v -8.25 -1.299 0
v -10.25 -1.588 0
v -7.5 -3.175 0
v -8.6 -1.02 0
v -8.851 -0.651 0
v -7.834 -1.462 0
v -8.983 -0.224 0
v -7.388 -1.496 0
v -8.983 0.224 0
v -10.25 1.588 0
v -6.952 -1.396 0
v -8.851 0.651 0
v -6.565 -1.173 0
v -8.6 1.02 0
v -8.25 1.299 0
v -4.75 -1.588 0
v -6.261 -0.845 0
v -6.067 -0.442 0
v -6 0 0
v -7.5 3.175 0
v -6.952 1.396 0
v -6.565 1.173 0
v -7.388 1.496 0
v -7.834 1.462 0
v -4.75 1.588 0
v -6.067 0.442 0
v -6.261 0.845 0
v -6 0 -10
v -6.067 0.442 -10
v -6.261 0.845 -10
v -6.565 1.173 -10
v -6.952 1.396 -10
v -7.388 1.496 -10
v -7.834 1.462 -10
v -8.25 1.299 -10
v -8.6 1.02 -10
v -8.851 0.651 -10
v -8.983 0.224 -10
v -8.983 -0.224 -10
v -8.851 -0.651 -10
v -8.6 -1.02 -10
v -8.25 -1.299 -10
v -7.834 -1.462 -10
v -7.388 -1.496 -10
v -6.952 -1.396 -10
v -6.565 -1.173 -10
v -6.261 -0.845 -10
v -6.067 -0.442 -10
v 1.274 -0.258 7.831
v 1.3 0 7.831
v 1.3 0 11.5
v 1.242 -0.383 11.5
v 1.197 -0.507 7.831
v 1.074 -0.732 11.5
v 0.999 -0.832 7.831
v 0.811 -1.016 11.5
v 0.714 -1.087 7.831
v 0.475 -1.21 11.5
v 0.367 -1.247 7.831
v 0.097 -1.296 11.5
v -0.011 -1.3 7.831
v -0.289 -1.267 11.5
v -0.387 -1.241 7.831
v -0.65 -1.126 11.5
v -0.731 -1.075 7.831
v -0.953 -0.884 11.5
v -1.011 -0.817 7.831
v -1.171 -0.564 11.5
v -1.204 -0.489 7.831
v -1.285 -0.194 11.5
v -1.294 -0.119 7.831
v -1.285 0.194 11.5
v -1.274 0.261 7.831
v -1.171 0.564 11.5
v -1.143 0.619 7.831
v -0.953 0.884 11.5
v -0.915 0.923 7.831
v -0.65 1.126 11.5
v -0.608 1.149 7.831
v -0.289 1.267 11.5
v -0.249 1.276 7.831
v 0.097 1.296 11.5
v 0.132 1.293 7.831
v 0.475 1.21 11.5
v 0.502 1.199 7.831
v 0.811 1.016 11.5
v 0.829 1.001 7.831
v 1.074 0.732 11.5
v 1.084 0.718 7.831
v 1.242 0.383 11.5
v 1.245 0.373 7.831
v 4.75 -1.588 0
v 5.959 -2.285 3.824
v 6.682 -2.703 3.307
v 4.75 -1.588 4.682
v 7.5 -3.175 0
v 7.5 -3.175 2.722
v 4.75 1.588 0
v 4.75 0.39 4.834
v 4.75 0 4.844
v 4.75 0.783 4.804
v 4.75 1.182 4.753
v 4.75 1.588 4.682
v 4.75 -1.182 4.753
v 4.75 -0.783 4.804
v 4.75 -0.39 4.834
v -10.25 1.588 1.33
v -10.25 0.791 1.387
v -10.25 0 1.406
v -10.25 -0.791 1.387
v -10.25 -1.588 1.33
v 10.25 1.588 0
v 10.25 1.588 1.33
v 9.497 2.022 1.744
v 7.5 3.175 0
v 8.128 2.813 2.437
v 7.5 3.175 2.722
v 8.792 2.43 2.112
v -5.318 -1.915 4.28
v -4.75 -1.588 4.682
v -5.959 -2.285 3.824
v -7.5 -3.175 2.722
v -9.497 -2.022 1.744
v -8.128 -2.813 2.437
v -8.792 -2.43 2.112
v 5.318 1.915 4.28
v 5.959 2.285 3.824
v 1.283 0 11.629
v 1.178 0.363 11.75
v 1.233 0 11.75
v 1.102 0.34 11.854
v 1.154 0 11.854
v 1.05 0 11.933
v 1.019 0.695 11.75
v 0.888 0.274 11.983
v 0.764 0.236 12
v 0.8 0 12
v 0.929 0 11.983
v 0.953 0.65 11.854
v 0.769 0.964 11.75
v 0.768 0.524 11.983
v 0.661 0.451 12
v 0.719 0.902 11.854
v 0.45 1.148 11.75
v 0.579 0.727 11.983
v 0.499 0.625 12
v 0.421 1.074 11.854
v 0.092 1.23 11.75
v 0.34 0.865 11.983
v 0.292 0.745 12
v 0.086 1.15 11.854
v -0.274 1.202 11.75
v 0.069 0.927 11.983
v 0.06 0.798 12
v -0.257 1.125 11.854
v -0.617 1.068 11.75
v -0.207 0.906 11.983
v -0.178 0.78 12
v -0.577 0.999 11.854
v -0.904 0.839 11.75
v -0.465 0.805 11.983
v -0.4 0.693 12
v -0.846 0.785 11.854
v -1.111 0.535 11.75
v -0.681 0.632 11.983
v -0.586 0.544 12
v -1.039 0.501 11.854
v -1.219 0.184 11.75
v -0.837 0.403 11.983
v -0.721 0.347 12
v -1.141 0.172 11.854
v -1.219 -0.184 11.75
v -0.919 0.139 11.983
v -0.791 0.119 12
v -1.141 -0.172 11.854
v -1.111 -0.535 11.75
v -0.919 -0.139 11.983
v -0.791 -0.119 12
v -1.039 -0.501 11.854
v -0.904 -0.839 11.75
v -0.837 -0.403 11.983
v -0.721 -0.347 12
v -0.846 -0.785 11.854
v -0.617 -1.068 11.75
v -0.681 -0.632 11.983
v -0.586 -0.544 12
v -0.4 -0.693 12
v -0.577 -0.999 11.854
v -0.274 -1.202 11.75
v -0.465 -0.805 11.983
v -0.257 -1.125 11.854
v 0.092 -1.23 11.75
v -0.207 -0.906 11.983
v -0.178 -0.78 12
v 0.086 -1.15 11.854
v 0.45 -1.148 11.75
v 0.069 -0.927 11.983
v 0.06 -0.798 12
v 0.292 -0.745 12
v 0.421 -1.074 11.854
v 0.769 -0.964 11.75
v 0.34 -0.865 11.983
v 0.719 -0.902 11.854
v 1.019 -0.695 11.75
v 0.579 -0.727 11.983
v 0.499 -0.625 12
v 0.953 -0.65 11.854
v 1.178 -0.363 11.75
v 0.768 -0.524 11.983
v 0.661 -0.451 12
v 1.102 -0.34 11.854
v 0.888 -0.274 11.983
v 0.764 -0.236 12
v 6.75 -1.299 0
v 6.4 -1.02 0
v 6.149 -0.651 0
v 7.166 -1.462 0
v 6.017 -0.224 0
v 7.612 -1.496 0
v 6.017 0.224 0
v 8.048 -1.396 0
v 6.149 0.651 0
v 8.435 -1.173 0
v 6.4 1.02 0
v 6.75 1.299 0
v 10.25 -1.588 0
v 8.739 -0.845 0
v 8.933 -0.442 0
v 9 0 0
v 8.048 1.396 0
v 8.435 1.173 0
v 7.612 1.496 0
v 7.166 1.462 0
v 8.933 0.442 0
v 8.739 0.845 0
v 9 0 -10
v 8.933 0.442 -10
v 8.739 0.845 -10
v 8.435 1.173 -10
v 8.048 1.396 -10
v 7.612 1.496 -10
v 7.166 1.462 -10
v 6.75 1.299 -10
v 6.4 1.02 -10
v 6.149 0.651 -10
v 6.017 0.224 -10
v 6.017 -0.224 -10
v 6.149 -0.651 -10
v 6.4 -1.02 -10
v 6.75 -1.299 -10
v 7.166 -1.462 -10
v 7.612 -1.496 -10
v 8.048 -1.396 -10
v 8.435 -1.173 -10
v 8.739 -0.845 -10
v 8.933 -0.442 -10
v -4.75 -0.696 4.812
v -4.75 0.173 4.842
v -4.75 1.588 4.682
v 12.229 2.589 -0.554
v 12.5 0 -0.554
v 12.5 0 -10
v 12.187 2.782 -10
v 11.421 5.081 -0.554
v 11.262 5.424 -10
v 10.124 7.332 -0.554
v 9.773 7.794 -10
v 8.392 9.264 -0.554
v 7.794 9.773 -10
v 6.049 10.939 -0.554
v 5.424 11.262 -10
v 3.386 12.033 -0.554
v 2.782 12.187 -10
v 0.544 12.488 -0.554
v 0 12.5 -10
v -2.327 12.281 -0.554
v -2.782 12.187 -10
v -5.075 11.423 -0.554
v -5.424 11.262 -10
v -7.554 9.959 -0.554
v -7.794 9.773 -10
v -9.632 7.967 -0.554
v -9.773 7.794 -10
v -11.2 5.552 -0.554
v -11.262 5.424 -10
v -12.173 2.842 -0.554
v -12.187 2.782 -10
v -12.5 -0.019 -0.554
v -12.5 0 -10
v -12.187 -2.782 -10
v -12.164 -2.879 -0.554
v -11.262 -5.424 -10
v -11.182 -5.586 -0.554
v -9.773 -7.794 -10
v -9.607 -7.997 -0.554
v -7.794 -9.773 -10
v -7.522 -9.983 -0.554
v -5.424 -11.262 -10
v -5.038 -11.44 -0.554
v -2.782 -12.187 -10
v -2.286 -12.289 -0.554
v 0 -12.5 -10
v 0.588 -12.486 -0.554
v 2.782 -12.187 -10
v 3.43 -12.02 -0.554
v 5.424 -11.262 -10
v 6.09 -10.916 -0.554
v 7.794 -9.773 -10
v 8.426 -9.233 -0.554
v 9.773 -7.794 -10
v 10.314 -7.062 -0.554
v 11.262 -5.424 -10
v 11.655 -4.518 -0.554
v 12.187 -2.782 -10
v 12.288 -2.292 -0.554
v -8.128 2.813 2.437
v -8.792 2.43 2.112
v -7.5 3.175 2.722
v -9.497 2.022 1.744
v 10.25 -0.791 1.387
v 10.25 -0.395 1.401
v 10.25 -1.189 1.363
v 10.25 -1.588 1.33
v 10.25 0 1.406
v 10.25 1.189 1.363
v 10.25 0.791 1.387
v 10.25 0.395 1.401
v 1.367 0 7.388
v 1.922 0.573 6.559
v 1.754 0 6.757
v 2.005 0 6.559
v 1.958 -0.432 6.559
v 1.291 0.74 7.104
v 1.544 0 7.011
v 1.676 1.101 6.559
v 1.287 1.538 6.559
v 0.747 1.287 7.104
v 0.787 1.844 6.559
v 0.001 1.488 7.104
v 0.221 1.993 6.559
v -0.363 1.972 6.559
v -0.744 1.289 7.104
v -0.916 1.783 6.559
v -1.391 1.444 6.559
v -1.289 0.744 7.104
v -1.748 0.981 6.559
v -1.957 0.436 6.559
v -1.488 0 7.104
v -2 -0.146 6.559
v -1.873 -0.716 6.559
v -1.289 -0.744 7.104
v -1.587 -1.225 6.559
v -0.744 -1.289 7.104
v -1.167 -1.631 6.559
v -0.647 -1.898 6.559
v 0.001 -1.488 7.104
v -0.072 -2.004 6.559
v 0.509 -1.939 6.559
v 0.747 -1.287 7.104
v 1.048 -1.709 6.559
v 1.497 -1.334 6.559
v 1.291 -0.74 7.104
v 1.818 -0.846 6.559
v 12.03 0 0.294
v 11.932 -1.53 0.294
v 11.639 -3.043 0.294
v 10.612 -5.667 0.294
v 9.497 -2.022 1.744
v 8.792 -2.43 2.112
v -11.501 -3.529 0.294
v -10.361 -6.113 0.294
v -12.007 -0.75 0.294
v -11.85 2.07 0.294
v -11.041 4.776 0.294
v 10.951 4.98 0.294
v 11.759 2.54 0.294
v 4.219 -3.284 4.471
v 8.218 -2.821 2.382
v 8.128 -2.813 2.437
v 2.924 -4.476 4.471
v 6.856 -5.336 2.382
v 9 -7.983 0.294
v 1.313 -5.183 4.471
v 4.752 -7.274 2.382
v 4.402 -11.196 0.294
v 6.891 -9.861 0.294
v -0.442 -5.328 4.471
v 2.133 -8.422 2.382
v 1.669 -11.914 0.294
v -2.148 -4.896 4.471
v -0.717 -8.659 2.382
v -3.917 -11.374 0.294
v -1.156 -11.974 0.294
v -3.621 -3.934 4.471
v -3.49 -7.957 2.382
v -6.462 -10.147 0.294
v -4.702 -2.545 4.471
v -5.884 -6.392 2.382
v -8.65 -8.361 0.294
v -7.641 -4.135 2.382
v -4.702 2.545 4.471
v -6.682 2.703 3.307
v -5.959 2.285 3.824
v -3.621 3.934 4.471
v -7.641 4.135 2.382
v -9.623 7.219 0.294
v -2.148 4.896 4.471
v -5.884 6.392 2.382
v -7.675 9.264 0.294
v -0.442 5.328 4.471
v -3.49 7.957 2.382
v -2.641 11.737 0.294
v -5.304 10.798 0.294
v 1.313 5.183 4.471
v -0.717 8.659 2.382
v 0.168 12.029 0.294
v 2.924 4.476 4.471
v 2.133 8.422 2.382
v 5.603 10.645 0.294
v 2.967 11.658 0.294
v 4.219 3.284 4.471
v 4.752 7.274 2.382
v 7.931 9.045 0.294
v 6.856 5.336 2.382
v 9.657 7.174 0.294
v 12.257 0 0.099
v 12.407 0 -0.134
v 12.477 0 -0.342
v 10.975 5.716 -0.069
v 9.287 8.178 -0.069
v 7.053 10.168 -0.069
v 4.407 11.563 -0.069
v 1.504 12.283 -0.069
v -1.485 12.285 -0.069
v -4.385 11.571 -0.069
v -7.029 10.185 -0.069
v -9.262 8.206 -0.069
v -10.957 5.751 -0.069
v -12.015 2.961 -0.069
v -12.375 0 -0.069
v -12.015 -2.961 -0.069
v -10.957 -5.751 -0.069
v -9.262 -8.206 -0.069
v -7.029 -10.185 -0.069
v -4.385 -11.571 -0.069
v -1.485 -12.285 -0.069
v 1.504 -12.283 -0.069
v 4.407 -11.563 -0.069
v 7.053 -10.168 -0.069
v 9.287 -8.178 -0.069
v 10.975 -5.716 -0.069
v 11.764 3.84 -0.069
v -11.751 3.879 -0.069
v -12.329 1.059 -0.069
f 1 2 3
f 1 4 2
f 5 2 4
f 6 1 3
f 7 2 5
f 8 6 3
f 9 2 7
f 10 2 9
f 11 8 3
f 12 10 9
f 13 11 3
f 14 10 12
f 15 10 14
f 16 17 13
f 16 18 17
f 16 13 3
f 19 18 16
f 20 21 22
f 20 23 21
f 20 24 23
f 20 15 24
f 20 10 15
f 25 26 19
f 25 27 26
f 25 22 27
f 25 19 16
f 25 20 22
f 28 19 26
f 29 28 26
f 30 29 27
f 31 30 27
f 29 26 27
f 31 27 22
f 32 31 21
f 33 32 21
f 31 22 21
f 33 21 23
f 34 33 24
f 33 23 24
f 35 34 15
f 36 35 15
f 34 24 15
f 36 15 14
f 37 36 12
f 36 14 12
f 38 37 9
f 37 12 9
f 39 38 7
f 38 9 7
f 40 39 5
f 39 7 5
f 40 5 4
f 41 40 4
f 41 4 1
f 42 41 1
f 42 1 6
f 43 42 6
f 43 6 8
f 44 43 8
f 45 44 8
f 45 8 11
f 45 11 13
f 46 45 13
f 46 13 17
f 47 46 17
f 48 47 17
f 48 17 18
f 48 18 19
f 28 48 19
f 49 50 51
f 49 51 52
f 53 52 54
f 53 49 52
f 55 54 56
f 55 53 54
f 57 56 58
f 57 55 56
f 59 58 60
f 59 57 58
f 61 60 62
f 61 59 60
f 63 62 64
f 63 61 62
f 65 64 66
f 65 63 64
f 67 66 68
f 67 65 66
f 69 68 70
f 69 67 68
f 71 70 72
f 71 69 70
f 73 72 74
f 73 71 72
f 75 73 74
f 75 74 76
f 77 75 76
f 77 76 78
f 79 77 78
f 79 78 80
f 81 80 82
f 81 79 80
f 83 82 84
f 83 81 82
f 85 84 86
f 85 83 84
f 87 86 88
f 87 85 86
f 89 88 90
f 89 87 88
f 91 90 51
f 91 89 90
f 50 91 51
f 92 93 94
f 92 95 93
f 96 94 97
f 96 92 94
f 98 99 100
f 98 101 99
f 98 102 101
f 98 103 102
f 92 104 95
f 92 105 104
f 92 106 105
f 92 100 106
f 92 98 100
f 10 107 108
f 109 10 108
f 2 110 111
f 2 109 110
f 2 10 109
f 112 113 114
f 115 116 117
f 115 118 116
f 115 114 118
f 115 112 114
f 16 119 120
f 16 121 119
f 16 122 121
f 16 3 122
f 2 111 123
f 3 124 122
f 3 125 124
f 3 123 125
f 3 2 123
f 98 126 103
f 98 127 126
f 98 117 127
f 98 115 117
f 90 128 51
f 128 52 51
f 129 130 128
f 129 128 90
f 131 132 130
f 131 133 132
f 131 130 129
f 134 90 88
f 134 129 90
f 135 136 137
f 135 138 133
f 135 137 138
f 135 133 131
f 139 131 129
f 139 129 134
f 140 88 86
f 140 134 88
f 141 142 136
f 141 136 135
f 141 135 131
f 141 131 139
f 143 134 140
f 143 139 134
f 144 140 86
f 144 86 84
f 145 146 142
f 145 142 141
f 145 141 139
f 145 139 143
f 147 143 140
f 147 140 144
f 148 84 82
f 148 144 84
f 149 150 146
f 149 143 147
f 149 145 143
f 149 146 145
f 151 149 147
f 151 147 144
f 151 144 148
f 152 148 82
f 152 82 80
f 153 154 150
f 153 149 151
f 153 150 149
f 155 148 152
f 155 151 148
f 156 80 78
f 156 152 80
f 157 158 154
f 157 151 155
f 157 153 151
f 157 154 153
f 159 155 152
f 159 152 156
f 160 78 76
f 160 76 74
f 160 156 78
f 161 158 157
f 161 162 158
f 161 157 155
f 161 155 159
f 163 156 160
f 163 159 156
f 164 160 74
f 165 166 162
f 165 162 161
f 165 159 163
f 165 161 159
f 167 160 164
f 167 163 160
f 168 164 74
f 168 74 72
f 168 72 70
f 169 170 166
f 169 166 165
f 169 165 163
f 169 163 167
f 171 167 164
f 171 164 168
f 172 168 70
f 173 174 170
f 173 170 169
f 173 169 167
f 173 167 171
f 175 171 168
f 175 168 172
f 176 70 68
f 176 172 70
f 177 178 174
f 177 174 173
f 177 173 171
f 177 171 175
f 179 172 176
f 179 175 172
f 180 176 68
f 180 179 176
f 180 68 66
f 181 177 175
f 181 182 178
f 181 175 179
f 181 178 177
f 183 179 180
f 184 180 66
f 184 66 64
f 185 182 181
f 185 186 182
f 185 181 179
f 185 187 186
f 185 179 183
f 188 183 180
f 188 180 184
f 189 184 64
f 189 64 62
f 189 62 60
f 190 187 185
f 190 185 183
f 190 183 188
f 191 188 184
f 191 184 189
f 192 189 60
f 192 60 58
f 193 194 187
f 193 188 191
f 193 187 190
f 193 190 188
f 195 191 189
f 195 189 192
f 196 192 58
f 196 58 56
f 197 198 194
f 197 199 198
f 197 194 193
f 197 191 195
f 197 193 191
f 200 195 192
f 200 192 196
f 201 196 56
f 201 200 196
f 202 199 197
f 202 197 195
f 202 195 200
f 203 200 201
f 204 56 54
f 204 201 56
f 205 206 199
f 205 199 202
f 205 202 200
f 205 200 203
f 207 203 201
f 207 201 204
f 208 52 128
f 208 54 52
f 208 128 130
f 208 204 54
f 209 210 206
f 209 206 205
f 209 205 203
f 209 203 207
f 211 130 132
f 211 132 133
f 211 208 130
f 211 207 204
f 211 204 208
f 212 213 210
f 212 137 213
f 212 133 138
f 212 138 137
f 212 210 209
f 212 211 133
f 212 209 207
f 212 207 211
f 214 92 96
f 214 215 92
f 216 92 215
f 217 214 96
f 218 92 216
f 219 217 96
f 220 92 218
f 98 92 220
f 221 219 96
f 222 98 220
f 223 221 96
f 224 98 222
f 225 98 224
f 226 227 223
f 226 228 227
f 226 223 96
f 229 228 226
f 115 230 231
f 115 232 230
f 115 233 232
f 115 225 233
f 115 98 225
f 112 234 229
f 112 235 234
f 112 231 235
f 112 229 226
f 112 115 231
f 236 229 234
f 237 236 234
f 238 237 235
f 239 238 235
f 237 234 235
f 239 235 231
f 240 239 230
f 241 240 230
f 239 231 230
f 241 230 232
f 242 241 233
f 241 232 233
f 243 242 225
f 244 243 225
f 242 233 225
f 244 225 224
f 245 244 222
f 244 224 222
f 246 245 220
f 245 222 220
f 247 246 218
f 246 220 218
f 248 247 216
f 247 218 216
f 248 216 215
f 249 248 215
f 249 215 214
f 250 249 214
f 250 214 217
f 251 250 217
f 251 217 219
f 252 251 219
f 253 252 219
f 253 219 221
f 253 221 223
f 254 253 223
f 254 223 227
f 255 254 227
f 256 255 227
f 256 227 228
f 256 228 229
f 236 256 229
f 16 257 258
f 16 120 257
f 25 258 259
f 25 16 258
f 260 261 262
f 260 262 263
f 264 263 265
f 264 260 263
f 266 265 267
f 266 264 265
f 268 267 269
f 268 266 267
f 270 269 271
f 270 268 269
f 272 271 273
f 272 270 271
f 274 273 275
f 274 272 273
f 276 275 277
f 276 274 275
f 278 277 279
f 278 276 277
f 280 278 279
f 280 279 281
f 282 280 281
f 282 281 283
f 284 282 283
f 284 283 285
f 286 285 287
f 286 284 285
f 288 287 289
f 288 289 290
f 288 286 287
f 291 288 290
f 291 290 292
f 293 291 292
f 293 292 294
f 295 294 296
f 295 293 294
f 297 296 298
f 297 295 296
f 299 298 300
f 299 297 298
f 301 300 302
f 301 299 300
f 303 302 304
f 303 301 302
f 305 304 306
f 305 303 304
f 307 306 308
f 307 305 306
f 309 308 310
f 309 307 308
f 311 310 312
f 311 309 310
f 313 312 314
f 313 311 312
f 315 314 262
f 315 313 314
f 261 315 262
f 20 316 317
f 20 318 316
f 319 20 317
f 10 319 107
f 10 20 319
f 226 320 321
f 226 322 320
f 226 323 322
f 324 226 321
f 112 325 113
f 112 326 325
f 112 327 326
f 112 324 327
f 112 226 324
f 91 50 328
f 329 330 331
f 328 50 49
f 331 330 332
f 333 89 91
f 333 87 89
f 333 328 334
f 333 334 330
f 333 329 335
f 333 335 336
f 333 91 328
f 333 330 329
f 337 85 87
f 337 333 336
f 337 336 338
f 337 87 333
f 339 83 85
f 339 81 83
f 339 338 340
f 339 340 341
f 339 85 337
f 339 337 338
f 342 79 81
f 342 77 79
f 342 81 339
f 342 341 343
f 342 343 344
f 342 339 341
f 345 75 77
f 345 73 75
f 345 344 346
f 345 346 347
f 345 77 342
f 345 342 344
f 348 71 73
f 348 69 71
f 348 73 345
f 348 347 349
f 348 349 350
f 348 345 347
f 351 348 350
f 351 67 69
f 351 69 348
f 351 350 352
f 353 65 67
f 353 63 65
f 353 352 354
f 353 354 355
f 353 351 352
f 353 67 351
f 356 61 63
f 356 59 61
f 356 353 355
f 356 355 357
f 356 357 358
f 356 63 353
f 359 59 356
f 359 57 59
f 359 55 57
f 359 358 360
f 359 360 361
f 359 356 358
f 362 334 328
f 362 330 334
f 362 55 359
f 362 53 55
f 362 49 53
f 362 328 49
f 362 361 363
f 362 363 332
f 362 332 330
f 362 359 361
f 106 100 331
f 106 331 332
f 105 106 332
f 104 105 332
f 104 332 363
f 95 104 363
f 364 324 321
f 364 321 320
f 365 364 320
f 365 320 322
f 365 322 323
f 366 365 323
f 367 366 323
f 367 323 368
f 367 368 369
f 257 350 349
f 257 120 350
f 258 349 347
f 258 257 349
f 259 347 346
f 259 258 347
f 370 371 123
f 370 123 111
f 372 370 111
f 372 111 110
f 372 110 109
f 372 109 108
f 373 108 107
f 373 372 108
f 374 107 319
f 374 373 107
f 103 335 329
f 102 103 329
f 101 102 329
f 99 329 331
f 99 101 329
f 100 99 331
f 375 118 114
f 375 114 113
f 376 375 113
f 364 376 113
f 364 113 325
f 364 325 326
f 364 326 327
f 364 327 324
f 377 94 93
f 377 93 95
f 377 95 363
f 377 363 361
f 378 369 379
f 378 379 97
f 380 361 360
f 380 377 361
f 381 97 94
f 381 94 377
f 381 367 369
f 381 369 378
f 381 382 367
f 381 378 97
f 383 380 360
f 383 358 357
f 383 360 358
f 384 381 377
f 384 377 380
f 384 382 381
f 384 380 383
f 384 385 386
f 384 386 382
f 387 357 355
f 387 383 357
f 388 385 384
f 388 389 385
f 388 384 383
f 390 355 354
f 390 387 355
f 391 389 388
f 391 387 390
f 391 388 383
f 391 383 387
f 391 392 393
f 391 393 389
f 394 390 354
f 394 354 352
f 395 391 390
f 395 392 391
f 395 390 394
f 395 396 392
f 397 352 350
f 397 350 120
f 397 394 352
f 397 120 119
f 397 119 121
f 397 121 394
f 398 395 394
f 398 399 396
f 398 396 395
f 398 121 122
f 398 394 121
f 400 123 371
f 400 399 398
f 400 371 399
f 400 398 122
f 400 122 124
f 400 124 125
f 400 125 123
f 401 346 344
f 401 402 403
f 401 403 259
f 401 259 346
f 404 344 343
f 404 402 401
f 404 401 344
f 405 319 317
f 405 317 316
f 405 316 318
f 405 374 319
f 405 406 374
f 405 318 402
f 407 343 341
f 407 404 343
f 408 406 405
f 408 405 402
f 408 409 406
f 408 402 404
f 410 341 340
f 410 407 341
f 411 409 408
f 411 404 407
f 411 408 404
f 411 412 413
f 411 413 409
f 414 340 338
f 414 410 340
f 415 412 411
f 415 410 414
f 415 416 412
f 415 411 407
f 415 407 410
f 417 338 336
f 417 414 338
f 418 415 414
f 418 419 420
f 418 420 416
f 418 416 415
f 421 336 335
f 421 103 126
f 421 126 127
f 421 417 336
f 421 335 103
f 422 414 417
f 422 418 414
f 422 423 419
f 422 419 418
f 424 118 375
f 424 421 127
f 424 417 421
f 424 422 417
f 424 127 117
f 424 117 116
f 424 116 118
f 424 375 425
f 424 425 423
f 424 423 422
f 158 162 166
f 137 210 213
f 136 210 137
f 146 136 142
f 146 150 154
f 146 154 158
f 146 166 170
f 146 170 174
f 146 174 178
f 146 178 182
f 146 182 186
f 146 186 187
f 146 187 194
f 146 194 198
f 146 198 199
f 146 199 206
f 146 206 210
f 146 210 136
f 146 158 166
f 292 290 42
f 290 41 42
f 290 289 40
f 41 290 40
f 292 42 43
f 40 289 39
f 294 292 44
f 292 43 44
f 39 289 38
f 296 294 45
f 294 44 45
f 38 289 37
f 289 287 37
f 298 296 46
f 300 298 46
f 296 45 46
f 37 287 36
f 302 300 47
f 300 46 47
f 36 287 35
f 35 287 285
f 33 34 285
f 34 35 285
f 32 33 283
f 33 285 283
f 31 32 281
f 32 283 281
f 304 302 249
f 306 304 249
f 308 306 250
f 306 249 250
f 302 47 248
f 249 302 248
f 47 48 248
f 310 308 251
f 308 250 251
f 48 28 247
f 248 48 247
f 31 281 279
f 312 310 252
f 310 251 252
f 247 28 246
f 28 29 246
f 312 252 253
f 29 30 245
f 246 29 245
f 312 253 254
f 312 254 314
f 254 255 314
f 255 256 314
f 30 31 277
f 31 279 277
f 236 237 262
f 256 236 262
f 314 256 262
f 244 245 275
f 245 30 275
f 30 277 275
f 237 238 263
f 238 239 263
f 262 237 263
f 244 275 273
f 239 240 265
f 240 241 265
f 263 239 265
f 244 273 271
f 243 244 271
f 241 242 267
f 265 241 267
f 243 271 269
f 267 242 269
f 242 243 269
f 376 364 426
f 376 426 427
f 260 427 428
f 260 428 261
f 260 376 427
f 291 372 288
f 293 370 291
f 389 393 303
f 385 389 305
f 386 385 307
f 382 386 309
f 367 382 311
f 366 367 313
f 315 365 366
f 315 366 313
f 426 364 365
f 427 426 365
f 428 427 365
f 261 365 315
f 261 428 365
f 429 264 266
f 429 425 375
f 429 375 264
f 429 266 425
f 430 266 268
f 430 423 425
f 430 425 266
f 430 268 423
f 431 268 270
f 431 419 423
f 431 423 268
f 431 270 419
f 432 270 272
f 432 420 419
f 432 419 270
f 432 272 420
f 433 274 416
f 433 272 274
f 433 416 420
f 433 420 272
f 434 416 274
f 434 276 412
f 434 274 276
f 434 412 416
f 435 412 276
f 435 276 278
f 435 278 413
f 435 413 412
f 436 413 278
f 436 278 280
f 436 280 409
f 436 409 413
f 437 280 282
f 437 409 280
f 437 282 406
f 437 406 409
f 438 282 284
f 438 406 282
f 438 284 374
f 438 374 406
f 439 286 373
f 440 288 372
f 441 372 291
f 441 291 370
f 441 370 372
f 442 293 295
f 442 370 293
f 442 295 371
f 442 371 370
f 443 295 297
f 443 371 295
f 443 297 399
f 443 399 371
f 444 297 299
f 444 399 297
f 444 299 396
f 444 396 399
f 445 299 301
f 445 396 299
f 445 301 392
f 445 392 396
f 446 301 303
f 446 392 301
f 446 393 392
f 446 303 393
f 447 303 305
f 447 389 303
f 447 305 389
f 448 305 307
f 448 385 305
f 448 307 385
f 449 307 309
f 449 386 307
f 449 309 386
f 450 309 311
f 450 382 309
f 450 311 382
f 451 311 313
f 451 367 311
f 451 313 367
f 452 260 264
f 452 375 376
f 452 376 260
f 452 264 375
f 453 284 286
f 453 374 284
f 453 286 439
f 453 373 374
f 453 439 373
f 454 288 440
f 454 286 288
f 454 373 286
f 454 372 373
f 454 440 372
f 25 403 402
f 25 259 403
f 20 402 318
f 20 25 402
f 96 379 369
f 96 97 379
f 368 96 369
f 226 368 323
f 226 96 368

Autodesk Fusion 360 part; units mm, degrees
sketch "Boceto1" plane through (0, 0, 0) normal (0, 0, 1) x (1, 0, 0)
  circle A0 centre (0, 0) radius 12.5
  line L0 (12.5, 0) -> (-12.5, 0) construction
  circle A1 centre (0, 0) radius 4 construction
  circle A2 centre (0, 0) radius 2 construction
  circle A3 centre (7.5, 0) radius 1.5
  circle A4 centre (-7.5, 0) radius 1.5
  line L1 (7.5, -3.1754) -> (10.25, -1.5877)
  line L2 (10.25, -1.5877) -> (10.25, 1.5877)
  line L3 (10.25, 1.5877) -> (7.5, 3.1754)
  line L4 (7.5, 3.1754) -> (4.75, 1.5877)
  line L5 (4.75, 1.5877) -> (4.75, -1.5877)
  line L6 (4.75, -1.5877) -> (7.5, -3.1754)
  line L7 (-7.5, -3.1754) -> (-4.75, -1.5877)
  line L8 (-4.75, -1.5877) -> (-4.75, 1.5877)
  line L9 (-4.75, 1.5877) -> (-7.5, 3.1754)
  line L10 (-7.5, 3.1754) -> (-10.25, 1.5877)
  line L11 (-10.25, 1.5877) -> (-10.25, -1.5877)
  line L12 (-10.25, -1.5877) -> (-7.5, -3.1754)
  point P0 (7.5, 0)
  point P1 (-7.5, 0)
  dimension "d1" = 25
  dimension "d9" = 8
  dimension "d10" = 4
  dimension "d11" = 3
  dimension "d12" = 3
  dimension "d13" = 2.75
  dimension "d14" = 2.75
  dimension "d29" = 7.5
  dimension "d30" = 7.5
extrude "Extruir1" add sketch "Boceto1" against normal blind 10 contours A0 | A3 | A4 | L1 L2 L3 L4 L5 L6 | L7 L8 L9 L10 L11 L12
ref_plane "PlanoDeObra1" through (0, 0, 7) normal (0, 0, 1) x (1, 0, 0)
sketch "Boceto2" plane through (0, 0, 7) normal (0, 0, 1) x (1, 0, 0)
  circle A0 centre (0, 0) radius 12.5
  circle A1 centre (0, 0) radius 1.3
  dimension "d5" = -11.2
loft "Solevación1" add profiles "Boceto2" section 1 contours A1 section 2 face at (-3.3879, -0.621, 0)
sketch "Boceto3" plane through (0, 0, 7) normal (0, 0, 1) x (-1, 0, 0)
  circle A0 centre (0, 0) radius 1.3
  circle A1 centre (0, 0) radius 2
  dimension "d6" = 4
sketch "Boceto4" plane through (0, 0, 7) normal (0, 0, 1) x (-1, 0, 0)
  circle A0 centre (0, 0) radius 1.3
extrude "Extruir5" cut sketch "Boceto1" along normal blind 14 contours L1 L2 L3 L4 L5 L6
extrude "Extruir6" cut sketch "Boceto1" along normal blind 29 contours A3
extrude "Extruir7" cut sketch "Boceto1" along normal mid plane 60 contours A3
extrude "Extruir8" cut sketch "Boceto1" along normal blind 25 contours L7 L8 L9 L10 L11 L12
extrude "Extruir9" cut sketch "Boceto1" along normal mid plane 52 contours A4
extrude "Extruir11" add 1 faces at (-0.3369, 0.5261, 7) along direction (0, 0, 1) blind 5
fillet "Empalme1" radius 1.5 1 edges at (-1.212, 0.4701, 7)
fillet "Empalme2" radius 0.5 1 edges at (-1.212, -0.4701, 12)
fillet "Empalme3" radius 1 1 edges at (-11.6541, -4.5202, 0)
